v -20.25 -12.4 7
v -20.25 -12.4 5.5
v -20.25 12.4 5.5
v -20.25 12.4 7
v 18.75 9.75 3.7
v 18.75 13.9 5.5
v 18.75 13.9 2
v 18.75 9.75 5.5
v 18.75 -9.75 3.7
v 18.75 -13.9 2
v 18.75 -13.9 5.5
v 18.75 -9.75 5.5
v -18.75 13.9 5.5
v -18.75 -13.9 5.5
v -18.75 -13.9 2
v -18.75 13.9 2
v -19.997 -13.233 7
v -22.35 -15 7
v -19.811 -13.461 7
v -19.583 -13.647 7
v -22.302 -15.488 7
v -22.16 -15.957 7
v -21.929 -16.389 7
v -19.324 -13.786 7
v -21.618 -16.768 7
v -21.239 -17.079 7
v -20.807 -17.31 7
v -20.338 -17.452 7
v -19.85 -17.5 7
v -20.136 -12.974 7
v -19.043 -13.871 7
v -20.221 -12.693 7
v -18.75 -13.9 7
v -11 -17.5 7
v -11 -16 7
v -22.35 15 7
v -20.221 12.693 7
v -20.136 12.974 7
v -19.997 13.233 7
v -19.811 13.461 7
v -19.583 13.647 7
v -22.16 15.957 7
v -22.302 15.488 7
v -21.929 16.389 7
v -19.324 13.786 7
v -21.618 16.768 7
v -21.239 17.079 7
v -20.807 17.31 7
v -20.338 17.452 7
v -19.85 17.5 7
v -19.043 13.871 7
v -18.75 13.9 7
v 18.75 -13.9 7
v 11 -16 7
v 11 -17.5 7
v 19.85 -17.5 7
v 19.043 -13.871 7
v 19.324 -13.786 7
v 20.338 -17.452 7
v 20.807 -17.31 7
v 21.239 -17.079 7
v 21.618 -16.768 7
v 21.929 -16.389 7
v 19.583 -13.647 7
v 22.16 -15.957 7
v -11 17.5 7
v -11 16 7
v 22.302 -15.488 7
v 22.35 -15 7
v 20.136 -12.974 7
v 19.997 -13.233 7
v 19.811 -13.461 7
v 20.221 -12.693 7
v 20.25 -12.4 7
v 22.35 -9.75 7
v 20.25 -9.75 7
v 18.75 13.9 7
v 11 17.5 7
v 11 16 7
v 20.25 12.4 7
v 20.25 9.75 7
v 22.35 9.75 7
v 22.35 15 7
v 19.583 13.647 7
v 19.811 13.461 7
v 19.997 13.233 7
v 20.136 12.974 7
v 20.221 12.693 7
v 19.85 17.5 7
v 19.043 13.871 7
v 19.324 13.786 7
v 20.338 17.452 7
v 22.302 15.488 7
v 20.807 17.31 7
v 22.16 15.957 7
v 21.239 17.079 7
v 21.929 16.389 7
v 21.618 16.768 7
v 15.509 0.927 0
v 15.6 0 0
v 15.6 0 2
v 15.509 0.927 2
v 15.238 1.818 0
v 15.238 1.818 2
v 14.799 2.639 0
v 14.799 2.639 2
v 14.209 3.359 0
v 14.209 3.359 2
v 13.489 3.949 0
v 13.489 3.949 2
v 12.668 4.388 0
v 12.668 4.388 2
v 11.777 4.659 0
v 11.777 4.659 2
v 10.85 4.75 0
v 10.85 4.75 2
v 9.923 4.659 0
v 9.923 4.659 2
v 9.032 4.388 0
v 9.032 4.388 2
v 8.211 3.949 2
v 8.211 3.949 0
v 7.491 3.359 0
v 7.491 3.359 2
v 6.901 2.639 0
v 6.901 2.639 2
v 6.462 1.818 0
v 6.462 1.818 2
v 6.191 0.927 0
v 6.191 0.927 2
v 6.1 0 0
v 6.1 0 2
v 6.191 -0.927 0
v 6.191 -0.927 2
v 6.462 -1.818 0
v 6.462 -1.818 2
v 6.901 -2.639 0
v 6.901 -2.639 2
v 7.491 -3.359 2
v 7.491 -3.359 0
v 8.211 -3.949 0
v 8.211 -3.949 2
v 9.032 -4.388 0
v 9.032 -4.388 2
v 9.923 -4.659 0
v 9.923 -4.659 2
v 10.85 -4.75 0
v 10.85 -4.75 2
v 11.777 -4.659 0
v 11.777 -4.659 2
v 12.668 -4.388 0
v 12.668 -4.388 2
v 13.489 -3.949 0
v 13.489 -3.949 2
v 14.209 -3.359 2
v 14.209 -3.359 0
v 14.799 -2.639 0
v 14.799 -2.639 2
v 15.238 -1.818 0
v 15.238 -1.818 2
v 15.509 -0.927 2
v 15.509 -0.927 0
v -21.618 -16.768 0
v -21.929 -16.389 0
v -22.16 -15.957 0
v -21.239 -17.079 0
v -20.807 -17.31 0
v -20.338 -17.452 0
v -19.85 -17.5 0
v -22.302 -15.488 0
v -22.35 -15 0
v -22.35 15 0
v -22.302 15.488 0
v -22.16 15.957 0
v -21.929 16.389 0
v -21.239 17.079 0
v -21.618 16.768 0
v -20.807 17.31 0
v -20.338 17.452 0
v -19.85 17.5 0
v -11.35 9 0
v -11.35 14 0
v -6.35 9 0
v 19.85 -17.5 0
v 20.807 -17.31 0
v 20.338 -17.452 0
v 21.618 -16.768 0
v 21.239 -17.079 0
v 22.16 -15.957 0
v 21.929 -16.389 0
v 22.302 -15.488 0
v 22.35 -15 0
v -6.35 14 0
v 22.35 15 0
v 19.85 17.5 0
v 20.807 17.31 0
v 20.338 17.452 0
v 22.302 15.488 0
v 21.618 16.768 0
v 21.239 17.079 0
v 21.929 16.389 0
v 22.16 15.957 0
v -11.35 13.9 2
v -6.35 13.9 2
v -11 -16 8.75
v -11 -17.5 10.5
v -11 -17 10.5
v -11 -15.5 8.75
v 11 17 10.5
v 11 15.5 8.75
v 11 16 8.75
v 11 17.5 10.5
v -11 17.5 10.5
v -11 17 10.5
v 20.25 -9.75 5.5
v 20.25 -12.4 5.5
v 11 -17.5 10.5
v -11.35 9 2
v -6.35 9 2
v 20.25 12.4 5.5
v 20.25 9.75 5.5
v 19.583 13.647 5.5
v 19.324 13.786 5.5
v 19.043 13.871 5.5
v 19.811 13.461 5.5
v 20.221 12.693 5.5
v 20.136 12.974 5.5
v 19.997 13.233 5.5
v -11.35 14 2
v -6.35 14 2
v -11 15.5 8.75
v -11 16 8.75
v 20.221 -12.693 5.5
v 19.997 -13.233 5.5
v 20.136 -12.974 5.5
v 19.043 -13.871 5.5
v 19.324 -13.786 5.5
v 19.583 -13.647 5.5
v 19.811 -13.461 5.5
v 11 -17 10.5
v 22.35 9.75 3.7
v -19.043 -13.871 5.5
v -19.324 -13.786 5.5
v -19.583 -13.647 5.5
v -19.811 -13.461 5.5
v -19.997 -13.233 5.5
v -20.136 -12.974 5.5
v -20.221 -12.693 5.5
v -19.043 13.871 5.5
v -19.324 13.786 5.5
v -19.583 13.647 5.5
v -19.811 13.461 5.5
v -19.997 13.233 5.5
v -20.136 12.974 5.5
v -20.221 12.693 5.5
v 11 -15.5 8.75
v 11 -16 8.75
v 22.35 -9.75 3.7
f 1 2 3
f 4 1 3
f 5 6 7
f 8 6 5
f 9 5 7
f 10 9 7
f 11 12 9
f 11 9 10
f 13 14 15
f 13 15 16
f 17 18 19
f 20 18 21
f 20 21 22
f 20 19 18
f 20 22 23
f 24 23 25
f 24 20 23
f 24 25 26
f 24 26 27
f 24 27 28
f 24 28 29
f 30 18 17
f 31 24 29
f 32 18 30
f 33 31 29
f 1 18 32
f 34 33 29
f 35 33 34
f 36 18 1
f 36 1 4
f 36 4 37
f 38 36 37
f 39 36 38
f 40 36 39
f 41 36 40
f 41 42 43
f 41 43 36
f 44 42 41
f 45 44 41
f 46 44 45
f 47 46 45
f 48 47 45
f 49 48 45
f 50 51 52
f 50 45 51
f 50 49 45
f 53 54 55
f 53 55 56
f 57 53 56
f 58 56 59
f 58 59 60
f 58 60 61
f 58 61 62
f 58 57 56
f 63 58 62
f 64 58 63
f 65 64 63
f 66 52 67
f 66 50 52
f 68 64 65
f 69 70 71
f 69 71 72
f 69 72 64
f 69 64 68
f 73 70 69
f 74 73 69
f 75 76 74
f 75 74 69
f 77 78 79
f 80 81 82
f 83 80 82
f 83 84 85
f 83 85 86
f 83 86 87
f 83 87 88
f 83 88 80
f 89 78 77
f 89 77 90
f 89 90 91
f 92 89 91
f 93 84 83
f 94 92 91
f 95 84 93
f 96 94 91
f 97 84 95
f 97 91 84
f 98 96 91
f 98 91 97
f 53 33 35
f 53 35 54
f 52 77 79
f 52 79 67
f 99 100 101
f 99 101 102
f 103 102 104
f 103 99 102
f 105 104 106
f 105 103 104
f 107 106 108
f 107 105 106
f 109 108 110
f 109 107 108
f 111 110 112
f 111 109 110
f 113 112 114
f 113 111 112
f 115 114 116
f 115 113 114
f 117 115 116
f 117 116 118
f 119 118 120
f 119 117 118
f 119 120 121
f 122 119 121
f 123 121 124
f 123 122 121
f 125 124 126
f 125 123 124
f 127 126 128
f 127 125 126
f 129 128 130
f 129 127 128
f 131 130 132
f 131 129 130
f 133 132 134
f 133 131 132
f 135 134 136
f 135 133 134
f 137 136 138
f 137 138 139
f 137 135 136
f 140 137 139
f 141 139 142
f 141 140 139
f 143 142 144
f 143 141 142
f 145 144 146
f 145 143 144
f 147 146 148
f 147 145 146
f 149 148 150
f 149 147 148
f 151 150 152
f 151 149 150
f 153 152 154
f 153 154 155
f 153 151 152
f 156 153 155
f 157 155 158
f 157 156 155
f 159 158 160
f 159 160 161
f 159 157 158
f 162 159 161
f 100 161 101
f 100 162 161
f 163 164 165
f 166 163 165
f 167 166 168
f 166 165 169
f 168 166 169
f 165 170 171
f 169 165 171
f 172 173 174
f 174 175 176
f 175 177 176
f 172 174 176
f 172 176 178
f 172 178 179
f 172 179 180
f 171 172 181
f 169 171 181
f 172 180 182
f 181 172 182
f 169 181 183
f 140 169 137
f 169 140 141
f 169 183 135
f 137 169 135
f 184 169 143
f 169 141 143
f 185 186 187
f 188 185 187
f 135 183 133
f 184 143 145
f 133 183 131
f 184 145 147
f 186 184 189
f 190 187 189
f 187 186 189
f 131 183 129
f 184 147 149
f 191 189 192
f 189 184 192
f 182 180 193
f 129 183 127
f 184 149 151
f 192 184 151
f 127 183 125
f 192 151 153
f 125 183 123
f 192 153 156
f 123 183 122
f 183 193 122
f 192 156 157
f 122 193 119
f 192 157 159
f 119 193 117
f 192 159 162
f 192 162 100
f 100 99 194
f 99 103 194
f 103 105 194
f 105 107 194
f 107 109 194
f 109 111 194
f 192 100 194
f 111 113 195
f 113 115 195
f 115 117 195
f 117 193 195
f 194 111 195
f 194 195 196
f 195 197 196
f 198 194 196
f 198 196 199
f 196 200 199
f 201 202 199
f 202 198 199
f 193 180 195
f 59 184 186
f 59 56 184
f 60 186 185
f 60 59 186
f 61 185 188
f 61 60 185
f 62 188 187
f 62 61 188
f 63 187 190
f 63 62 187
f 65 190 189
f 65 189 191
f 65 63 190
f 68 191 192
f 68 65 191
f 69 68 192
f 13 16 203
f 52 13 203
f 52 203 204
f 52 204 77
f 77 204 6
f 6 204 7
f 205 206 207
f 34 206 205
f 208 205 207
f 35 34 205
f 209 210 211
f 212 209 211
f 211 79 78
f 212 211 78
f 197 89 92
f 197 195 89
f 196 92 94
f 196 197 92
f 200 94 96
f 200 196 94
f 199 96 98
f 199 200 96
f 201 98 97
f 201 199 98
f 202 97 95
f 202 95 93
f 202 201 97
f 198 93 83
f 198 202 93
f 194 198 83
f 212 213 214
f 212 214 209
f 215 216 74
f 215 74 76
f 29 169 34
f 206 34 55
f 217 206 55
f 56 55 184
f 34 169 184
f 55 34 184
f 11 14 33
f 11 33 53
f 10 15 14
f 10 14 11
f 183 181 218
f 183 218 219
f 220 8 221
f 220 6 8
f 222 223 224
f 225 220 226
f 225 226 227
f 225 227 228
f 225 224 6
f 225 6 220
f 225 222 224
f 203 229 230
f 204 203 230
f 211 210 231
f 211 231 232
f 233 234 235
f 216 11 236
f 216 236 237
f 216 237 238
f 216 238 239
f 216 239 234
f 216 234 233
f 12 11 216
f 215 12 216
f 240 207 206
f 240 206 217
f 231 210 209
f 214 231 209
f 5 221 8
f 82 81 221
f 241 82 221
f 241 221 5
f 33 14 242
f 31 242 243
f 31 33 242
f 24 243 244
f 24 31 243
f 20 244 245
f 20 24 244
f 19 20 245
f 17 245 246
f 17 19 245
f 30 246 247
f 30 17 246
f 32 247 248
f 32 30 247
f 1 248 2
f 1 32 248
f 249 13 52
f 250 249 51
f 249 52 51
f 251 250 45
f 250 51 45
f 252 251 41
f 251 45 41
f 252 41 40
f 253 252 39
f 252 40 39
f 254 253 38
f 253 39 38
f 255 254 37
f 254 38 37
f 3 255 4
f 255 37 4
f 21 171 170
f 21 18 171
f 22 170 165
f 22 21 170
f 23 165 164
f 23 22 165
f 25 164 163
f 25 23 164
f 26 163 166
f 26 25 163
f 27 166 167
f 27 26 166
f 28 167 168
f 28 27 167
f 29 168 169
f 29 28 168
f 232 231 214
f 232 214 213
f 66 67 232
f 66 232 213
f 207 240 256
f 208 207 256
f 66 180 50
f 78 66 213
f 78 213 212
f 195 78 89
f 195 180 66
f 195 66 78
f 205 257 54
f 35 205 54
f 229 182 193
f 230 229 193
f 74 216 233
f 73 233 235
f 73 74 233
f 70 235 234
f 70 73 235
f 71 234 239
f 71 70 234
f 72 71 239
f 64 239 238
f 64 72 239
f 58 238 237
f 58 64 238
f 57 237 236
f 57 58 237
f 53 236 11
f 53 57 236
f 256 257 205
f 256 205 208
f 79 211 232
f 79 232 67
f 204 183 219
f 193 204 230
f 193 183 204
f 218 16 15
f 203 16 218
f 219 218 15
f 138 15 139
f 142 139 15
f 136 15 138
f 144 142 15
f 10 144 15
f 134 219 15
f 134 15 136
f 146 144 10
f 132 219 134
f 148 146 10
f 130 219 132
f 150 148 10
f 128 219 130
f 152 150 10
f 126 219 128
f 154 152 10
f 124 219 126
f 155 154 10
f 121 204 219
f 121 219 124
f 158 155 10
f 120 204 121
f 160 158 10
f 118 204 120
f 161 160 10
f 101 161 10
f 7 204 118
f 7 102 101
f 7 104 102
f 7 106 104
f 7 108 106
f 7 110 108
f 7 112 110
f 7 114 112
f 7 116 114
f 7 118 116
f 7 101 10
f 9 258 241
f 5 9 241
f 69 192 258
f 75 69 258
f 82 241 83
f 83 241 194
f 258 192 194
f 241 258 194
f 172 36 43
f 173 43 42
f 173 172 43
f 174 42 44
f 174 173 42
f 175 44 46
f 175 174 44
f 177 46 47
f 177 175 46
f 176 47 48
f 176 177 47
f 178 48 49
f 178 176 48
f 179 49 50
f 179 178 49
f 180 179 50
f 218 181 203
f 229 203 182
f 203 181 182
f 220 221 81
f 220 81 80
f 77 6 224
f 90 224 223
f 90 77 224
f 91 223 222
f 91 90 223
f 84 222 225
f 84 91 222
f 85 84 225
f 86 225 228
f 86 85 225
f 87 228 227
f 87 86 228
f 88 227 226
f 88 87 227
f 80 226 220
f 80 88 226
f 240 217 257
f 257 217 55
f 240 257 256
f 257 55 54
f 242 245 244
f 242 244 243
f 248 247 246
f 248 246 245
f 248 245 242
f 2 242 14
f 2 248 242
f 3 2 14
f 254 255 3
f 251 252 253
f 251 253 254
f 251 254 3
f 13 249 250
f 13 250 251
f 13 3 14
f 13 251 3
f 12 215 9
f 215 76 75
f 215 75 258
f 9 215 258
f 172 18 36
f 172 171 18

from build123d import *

# Parameters (mm, degrees)
CROQUIS1_W              = 44.7
CROQUIS1_H              = 35
CROQUIS1_R              = 4.75
CROQUIS1_W_2            = 5
CROQUIS1_H_2            = 5
SALIENTE_EXTRUIR1_DEPTH = 2
CROQUIS2_W              = 44.7
CROQUIS2_H              = 35
CROQUIS2_W_2            = 40.5
CROQUIS2_H_2            = 27.8
SALIENTE_EXTRUIR2_DEPTH = 5
REDONDEO1_R             = 1.5
REDONDEO2_R             = 2.5
SALIENTE_EXTRUIR3_START = 3.5
SALIENTE_EXTRUIR3_DEPTH = 3.5
CROQUIS5_W              = 3.3
CROQUIS5_H              = 19.5
CORTAR_EXTRUIR1_DEPTH   = 5.5
CROQUIS6_W              = 22
CROQUIS6_H              = 2
SALIENTE_EXTRUIR4_DEPTH = 3.5
CROQUIS7_W              = 1.75
CROQUIS7_H              = 0.5
CORTAR_EXTRUIR2_DEPTH   = 40.098881058


with BuildPart() as part:
    # Croquis1 → Saliente-Extruir1 (new body)
    with BuildSketch(Plane.XY):
        Rectangle(CROQUIS1_W, CROQUIS1_H)
        with Locations((10.85, 0)):
            Circle(CROQUIS1_R, mode=Mode.SUBTRACT)
        with Locations((-8.85, 11.5)):
            Rectangle(CROQUIS1_W_2, CROQUIS1_H_2, mode=Mode.SUBTRACT)
    extrude(amount=SALIENTE_EXTRUIR1_DEPTH)

    # Croquis2 → Saliente-Extruir2 (add)
    with BuildSketch(Plane.XY.offset(2)):
        Rectangle(CROQUIS2_W, CROQUIS2_H)
        Rectangle(CROQUIS2_W_2, CROQUIS2_H_2, mode=Mode.SUBTRACT)
    extrude(amount=SALIENTE_EXTRUIR2_DEPTH)

    # Redondeo1
    redondeo1_edges = [part.edges().sort_by_distance(p)[0] for p in [
        (20.25, 13.9, 4.5),
        (-20.25, 13.9, 4.5),
        (-20.25, -13.9, 4.5),
        (20.25, -13.9, 4.5),
    ]]
    fillet(redondeo1_edges, radius=REDONDEO1_R)

    # Redondeo2
    redondeo2_edges = [part.edges().sort_by_distance(p)[0] for p in [
        (-22.35, -17.5, 3.5),
        (-22.35, 17.5, 3.5),
        (22.35, 17.5, 3.5),
        (22.35, -17.5, 3.5),
    ]]
    fillet(redondeo2_edges, radius=REDONDEO2_R)

    # Croquis4 → Saliente-Extruir3 (add)
    with BuildSketch(Plane.XY.offset(2).offset(SALIENTE_EXTRUIR3_START)):
        with BuildLine():
            Line((-20.25, 12.4), (-20.25, -12.4))
            ThreePointArc((-20.25, -12.4), (-19.810660172, -13.460660172), (-18.75, -13.9))
            Line((-18.75, -13.9), (-18.75, 13.9))
            ThreePointArc((-18.75, 13.9), (-19.810660172, 13.460660172), (-20.25, 12.4))
        make_face()
        with BuildLine():
            Line((20.25, -12.4), (20.25, 12.4))
            ThreePointArc((20.25, 12.4), (19.810660172, 13.460660172), (18.75, 13.9))
            Line((18.75, 13.9), (18.75, -13.9))
            ThreePointArc((18.75, -13.9), (19.810660172, -13.460660172), (20.25, -12.4))
        make_face()
    extrude(amount=-SALIENTE_EXTRUIR3_DEPTH)

    # Croquis5 → Cortar-Extruir1 (cut)
    with BuildSketch(Plane(origin=(22.35, 0, 0), x_dir=(0, 0, -1), z_dir=(1, 0, 0))):
        with Locations((-5.35, 0)):
            Rectangle(CROQUIS5_W, CROQUIS5_H)
    extrude(amount=-CORTAR_EXTRUIR1_DEPTH, mode=Mode.SUBTRACT)

    # Croquis6 → Saliente-Extruir4 (add)
    with BuildSketch(Plane.XY.offset(7)):
        with Locations((0, -16.5)):
            Rectangle(CROQUIS6_W, CROQUIS6_H)
        with Locations((0, 16.5)):
            Rectangle(CROQUIS6_W, CROQUIS6_H)
    extrude(amount=SALIENTE_EXTRUIR4_DEPTH)

    # Croquis7 → Cortar-Extruir2 (cut, through all)
    with BuildSketch(Plane(origin=(11, 0, 0), x_dir=(0, 0, -1), z_dir=(1, 0, 0))):
        Polygon((-10.5, -15.5), (-10.5, -17), (-8.75, -15.5), align=None)
        Polygon((-8.75, 15.5), (-10.5, 17), (-10.5, 15.5), align=None)
        with Locations((-7.875, 15.75)):
            Rectangle(CROQUIS7_W, CROQUIS7_H)
        with Locations((-7.875, -15.75)):
            Rectangle(CROQUIS7_W, CROQUIS7_H)
    extrude(amount=-CORTAR_EXTRUIR2_DEPTH, mode=Mode.SUBTRACT)


solid = part.part
